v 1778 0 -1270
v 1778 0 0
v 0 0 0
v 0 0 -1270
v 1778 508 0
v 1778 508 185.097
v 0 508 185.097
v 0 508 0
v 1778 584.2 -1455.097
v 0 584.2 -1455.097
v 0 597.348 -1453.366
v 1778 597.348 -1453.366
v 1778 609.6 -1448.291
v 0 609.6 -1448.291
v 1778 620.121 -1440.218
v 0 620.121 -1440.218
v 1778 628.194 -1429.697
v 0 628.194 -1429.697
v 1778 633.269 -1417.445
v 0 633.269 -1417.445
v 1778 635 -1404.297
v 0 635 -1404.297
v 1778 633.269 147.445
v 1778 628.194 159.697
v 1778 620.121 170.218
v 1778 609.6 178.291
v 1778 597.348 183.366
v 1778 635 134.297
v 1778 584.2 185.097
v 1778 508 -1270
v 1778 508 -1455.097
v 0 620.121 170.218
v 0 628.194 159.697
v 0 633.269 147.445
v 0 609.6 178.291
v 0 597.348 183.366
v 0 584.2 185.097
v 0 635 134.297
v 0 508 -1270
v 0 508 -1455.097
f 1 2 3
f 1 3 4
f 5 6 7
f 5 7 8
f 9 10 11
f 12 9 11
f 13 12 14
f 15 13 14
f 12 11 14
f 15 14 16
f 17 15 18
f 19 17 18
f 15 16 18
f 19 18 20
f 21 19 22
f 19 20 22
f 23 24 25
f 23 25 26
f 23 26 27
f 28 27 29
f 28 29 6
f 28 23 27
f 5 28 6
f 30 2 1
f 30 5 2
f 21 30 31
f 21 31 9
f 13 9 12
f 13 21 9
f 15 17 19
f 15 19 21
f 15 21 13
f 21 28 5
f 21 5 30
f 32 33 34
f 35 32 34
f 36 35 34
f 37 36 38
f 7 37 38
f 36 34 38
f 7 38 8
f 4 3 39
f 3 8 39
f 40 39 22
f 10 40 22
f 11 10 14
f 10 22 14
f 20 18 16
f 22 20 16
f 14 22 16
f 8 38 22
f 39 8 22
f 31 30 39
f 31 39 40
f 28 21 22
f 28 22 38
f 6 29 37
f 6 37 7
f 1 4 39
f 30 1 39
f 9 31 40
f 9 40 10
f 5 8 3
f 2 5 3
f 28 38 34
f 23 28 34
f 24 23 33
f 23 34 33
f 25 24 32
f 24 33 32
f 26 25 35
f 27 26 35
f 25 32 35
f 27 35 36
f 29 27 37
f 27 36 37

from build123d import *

# Parameters (mm, degrees)
BOSS_EXTRUDE1_DEPTH = 1778


with BuildPart() as part:
    # Sketch1 → Boss-Extrude1 (new body)
    with BuildSketch(Plane(origin=(0, 0, 0), x_dir=(0, 0, -1), z_dir=(1, 0, 0))):
        with BuildLine():
            Line((0, 0), (1270, 0))
            Line((1270, 0), (1270, 508))
            Line((1270, 508), (1455.096882898, 508))
            Line((1455.096882898, 508), (1455.096882898, 584.2))
            ThreePointArc((1455.096882898, 584.2), (1440.217907382, 620.121024484), (1404.296882898, 635))
            Line((1404.296882898, 635), (-134.296882898, 635))
            ThreePointArc((-134.296882898, 635), (-170.217907382, 620.121024484), (-185.096882898, 584.2))
            Line((-185.096882898, 584.2), (-185.096882898, 508))
            Line((-185.096882898, 508), (0, 508))
            Line((0, 508), (0, 0))
        make_face()
    extrude(amount=BOSS_EXTRUDE1_DEPTH)


solid = part.part
